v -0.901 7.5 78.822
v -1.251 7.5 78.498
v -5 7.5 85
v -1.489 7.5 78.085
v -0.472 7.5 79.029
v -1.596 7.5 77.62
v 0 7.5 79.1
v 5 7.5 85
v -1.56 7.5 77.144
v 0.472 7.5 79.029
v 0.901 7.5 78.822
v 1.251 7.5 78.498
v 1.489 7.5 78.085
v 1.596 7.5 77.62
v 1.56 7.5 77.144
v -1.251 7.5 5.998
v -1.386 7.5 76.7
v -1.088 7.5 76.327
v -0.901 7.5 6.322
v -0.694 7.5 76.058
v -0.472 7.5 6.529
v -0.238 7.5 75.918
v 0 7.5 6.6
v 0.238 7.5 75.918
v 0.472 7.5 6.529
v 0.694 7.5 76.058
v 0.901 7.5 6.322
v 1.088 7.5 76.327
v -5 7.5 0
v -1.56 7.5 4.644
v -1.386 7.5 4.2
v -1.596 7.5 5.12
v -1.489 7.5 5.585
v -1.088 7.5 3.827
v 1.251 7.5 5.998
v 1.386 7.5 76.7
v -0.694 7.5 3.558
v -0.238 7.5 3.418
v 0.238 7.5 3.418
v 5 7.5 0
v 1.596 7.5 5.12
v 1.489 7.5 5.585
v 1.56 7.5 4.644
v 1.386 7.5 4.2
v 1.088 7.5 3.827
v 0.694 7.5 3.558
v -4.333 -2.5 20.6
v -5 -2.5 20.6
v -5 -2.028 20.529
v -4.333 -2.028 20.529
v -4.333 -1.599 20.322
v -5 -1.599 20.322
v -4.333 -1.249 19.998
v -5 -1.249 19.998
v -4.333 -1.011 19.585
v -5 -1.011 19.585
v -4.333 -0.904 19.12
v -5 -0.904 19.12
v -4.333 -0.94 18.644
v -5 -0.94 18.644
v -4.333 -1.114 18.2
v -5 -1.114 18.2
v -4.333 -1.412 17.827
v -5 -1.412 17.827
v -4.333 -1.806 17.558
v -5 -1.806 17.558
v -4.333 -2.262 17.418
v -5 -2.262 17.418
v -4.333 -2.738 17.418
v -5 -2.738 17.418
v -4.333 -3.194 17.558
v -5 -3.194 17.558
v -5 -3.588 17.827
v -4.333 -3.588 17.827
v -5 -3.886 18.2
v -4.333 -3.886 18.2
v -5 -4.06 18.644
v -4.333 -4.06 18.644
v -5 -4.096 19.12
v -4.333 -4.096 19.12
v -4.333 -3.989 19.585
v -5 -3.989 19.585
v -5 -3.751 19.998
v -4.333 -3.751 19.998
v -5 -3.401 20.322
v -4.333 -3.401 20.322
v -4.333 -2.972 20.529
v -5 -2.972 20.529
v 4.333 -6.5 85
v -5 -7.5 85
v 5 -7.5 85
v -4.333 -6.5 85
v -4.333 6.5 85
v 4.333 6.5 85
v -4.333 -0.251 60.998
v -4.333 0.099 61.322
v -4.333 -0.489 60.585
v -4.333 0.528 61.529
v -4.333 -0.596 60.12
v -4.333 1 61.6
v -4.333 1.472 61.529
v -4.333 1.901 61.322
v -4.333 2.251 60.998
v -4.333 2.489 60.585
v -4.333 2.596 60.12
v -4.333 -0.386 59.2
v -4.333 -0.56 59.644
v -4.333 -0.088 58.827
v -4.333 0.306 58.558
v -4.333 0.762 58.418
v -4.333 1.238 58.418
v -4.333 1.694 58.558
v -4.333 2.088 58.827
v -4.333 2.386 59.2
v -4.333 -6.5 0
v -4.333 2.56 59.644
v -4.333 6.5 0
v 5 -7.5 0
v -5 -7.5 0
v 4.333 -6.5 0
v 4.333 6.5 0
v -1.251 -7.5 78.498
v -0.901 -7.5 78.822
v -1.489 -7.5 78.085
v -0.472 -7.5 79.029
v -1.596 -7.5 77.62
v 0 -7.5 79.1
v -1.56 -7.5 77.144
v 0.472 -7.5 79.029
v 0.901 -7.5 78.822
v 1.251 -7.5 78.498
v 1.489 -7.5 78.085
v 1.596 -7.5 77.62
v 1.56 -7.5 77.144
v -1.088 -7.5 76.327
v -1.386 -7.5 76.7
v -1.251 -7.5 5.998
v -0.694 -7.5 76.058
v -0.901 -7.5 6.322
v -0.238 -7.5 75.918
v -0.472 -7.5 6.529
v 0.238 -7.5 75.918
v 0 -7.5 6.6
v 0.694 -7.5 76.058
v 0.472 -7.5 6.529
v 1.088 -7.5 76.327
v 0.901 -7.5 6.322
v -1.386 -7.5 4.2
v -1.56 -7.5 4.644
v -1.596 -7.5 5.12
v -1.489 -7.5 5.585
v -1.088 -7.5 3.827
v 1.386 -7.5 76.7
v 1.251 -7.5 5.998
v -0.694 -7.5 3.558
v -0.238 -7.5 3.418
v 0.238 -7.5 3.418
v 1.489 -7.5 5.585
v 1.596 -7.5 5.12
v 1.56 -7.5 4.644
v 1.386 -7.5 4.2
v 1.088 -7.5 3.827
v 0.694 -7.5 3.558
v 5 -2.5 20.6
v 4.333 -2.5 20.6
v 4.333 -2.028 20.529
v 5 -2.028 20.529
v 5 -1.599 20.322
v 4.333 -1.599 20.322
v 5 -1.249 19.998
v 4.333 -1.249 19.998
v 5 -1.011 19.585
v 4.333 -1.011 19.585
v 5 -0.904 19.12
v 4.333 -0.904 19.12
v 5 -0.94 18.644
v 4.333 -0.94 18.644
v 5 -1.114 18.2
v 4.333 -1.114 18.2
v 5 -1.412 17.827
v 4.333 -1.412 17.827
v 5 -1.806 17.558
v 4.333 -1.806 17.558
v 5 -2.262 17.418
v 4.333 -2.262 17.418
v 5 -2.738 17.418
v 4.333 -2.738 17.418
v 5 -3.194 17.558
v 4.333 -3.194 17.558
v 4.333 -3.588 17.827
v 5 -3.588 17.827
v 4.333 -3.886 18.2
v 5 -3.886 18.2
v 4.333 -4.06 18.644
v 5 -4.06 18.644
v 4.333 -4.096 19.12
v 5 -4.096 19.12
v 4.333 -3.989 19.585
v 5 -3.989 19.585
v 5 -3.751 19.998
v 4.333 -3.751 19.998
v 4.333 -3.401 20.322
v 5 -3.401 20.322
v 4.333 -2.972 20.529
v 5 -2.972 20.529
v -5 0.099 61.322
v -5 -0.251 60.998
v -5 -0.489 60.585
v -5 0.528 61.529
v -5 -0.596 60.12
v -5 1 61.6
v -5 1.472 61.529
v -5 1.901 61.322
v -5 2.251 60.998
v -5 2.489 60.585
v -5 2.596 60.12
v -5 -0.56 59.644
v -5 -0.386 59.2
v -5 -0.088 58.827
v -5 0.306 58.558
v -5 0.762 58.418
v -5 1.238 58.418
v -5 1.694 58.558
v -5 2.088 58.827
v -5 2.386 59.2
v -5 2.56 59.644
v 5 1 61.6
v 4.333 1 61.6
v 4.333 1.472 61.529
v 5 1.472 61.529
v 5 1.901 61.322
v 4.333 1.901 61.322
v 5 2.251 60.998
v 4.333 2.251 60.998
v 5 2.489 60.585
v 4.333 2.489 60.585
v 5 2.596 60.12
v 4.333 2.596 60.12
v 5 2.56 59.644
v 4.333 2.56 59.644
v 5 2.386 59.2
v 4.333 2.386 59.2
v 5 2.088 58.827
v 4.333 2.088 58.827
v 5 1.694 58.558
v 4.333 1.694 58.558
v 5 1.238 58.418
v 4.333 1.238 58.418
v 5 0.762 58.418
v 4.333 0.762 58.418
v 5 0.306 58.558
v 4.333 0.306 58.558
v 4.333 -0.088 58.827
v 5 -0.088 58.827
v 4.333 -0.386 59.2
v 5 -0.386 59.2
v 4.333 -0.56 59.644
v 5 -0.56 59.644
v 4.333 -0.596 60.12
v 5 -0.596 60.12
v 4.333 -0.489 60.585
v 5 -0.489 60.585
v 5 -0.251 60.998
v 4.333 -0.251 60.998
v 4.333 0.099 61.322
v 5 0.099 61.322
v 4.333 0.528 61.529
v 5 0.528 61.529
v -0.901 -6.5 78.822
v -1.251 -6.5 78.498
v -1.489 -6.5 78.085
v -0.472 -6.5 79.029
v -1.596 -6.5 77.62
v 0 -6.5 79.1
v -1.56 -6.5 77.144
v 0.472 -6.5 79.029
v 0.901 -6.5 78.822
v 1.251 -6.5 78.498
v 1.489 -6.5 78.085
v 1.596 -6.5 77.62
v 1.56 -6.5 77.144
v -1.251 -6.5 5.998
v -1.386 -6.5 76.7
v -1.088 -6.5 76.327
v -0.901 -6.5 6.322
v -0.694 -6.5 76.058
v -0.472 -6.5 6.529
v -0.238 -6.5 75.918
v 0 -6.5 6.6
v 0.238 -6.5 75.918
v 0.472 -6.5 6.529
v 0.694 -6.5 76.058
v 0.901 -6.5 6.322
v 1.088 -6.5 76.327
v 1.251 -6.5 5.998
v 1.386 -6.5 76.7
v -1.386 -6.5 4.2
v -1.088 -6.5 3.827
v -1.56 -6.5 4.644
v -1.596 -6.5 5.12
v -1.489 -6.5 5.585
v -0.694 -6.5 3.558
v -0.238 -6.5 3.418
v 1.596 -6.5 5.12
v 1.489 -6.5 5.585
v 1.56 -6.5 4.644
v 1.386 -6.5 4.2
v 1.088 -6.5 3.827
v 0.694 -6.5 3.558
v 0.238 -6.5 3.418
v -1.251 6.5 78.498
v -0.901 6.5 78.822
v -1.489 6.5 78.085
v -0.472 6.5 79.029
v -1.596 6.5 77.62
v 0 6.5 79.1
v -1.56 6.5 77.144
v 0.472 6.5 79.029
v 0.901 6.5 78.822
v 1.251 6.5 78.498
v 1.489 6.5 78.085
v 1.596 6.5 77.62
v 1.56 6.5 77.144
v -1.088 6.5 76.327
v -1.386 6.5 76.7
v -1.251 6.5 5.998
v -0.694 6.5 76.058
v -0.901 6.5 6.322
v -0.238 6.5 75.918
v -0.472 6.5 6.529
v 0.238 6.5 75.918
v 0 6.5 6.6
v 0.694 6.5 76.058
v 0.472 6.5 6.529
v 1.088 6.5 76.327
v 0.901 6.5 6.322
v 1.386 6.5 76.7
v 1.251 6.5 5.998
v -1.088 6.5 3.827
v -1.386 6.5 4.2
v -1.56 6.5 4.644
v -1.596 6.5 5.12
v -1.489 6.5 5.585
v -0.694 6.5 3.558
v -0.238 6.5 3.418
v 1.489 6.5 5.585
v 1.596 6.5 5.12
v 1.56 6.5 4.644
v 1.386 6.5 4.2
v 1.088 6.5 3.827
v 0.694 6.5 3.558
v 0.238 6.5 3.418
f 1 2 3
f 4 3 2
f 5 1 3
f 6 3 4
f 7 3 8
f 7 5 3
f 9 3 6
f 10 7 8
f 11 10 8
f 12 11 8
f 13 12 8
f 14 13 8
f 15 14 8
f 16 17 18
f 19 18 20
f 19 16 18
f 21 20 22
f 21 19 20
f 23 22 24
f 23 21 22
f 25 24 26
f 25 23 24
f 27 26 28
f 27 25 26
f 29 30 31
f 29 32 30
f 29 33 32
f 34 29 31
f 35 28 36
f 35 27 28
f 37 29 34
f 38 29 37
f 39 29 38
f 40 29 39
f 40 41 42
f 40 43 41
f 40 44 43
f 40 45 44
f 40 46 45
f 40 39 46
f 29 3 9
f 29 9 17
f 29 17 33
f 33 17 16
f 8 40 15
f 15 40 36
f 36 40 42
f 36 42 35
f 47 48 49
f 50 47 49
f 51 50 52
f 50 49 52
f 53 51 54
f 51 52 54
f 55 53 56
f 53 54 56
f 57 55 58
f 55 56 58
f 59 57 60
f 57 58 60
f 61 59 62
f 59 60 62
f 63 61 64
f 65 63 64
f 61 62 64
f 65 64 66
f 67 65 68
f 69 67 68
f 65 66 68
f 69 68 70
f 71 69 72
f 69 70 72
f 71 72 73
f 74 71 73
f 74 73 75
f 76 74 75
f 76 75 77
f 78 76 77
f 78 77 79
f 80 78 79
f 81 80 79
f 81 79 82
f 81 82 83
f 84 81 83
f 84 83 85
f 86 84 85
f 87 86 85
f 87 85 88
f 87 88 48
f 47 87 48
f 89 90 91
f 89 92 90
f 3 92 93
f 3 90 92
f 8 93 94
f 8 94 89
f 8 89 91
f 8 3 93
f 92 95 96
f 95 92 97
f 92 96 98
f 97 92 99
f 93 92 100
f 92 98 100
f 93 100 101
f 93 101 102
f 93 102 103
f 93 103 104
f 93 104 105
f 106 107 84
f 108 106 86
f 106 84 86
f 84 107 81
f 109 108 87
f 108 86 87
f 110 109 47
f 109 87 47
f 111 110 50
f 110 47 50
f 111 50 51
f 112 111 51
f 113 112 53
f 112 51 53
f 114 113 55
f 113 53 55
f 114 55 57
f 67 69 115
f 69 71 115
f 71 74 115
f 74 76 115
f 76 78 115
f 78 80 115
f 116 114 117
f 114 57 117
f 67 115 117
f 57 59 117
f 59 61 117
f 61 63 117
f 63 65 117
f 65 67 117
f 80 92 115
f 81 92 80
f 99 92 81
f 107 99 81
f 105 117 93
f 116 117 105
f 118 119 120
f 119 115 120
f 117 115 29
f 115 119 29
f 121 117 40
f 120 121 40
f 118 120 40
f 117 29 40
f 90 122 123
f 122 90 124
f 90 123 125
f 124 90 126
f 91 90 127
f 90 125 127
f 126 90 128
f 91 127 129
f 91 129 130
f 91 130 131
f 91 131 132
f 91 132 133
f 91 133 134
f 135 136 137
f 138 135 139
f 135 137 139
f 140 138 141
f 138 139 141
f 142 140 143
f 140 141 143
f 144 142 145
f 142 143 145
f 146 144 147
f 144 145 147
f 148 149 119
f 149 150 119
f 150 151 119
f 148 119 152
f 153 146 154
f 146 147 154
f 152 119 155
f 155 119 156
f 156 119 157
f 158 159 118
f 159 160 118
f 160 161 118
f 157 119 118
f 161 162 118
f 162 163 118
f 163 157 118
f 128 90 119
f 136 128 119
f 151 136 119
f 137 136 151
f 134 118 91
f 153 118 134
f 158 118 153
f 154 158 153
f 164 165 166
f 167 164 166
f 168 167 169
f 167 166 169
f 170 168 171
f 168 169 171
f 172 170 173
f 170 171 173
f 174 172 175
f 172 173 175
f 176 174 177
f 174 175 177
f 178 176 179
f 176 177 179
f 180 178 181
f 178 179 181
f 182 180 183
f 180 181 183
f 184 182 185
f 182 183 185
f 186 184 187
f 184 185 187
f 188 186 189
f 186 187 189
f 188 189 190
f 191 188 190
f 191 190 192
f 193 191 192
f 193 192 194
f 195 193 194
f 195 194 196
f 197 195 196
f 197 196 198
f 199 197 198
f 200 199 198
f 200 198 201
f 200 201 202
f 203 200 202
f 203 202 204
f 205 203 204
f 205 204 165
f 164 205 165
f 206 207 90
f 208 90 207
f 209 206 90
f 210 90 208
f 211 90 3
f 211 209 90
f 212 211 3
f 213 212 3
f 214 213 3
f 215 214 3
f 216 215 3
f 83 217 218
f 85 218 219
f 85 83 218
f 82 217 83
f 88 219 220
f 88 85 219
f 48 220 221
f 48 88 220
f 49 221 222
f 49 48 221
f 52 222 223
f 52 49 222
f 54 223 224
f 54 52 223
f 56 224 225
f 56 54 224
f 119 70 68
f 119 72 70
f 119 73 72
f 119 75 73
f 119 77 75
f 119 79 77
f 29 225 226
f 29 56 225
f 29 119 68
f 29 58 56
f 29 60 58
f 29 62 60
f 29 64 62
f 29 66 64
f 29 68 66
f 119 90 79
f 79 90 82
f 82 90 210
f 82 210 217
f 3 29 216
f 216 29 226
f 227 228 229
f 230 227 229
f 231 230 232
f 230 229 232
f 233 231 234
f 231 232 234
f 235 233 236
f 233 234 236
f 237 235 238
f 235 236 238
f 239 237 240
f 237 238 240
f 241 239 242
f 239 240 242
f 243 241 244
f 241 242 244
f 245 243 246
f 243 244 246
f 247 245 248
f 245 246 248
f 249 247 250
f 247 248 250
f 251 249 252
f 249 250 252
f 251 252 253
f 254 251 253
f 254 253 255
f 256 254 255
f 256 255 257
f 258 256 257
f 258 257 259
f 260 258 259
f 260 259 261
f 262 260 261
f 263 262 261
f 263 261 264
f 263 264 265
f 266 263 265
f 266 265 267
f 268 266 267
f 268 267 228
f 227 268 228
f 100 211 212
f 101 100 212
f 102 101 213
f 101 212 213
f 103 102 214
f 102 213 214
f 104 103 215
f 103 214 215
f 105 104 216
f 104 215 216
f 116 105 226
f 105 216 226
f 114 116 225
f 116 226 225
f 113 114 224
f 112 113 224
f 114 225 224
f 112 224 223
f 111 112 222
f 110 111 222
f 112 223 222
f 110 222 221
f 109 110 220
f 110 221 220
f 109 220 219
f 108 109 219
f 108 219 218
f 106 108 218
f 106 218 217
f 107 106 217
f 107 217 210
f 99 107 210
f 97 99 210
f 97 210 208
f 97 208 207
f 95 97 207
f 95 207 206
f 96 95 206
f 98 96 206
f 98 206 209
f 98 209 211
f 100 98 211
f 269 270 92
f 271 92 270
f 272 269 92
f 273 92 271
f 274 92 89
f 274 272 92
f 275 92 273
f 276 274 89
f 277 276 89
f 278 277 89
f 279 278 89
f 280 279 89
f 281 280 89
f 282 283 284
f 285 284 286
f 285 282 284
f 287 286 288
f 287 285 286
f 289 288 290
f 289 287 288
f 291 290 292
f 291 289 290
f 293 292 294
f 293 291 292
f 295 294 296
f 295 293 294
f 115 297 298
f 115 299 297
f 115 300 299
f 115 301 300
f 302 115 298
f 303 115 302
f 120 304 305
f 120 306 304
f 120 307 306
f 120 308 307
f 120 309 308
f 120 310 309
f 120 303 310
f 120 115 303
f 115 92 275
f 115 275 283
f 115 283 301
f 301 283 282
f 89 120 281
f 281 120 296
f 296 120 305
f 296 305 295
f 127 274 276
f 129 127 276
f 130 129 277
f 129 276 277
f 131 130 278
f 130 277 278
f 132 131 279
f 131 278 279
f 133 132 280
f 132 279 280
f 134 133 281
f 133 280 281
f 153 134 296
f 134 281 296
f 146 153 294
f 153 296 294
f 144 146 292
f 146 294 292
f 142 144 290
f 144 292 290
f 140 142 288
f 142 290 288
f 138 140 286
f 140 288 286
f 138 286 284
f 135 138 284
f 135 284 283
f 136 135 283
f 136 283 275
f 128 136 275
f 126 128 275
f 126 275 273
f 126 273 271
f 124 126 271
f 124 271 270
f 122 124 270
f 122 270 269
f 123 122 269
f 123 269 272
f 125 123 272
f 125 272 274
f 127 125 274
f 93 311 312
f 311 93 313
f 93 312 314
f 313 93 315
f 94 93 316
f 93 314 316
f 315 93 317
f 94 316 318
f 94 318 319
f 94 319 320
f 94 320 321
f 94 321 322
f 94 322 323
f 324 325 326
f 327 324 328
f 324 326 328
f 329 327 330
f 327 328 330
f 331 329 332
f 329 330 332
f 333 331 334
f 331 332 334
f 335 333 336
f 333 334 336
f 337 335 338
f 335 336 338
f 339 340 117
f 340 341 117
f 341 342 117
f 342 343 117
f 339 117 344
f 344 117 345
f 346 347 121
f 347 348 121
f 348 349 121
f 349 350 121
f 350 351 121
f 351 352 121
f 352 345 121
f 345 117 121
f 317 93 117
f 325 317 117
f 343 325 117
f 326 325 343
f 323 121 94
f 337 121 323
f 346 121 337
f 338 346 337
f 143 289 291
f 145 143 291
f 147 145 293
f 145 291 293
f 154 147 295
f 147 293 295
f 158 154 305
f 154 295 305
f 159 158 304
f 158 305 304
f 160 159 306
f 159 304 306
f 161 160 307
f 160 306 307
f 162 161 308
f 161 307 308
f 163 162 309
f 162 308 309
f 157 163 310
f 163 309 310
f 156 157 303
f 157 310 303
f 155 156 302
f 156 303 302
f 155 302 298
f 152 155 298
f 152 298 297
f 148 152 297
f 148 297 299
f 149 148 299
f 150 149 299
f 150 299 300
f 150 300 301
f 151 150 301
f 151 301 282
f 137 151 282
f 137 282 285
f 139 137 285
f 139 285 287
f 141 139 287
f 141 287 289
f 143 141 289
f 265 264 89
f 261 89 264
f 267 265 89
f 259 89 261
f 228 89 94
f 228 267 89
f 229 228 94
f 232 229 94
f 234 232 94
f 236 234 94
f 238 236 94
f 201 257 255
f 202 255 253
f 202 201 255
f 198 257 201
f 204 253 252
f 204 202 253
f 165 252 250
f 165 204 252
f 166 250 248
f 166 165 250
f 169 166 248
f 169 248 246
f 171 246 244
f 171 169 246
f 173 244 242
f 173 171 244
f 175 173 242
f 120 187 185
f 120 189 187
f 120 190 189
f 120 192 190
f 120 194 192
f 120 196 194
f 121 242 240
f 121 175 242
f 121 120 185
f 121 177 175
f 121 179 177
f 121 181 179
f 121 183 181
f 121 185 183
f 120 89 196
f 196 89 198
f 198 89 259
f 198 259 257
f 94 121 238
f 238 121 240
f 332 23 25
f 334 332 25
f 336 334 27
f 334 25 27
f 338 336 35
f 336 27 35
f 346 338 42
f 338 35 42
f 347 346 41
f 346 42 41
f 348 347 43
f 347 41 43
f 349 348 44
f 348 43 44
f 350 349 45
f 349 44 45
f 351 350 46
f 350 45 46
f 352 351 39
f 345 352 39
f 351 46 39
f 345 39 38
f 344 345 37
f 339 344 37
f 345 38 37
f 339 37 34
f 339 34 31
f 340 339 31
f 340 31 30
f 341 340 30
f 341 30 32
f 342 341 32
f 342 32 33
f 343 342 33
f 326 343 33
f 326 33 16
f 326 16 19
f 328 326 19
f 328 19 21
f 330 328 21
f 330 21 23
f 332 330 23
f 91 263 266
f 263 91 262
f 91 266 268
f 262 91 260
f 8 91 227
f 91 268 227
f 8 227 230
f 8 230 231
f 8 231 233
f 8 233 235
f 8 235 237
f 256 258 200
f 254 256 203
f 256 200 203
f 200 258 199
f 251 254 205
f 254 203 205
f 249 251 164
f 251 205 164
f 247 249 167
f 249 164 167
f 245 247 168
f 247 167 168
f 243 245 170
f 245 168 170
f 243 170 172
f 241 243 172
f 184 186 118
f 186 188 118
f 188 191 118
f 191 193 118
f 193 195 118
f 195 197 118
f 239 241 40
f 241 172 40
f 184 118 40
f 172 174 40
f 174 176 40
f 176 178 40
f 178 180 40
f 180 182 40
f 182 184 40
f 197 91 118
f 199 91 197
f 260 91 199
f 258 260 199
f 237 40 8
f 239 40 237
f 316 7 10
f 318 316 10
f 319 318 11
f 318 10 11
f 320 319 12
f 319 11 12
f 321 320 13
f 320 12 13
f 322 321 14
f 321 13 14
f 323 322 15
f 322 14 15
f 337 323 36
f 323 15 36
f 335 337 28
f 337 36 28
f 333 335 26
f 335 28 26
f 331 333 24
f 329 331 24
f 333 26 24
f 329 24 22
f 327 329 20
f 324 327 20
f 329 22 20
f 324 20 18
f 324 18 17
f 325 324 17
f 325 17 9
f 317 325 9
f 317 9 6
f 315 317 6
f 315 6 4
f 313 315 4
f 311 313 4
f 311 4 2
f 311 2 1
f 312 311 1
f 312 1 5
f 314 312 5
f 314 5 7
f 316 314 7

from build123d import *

# Parameters (mm, degrees)
SKETCH_1_W          = 10
SKETCH_1_H          = 15
SKETCH_1_W_2        = 8.666666666
SKETCH_1_H_2        = 13
EXTRUDE_1_DEPTH     = 85
SKETCH_3_R          = 1.6
CUT_EXTRUDE_2_DEPTH = 87.458082329
SKETCH_4_R          = 1.6
CUT_EXTRUDE_3_DEPTH = 86.914201387


with BuildPart() as part:
    # ｽｹｯﾁ1 → ﾎﾞｽ - 押し出し1 (new body)
    with BuildSketch(Plane.XY):
        Rectangle(SKETCH_1_W, SKETCH_1_H)
        Rectangle(SKETCH_1_W_2, SKETCH_1_H_2, mode=Mode.SUBTRACT)
    extrude(amount=EXTRUDE_1_DEPTH)

    # ｽｹｯﾁ3 → ｶｯﾄ - 押し出し2 (cut, through all)
    with BuildSketch(Plane(origin=(0, 7.5, 0), x_dir=(1, 0, 0), z_dir=(0, 1, 0))):
        with Locations(Location((0, -77.5, 0), (0, 0, 270))):
            Circle(SKETCH_3_R)
        with Locations(Location((0, -5, 0), (0, 0, 270))):
            Circle(SKETCH_3_R)
    extrude(amount=-CUT_EXTRUDE_2_DEPTH, mode=Mode.SUBTRACT)

    # ｽｹｯﾁ4 → ｶｯﾄ - 押し出し3 (cut, through all)
    with BuildSketch(Plane.ZY.offset(5)):
        with Locations((60, 1)):
            Circle(SKETCH_4_R)
        with Locations((19, -2.5)):
            Circle(SKETCH_4_R)
    extrude(amount=-CUT_EXTRUDE_3_DEPTH, mode=Mode.SUBTRACT)


solid = part.part
